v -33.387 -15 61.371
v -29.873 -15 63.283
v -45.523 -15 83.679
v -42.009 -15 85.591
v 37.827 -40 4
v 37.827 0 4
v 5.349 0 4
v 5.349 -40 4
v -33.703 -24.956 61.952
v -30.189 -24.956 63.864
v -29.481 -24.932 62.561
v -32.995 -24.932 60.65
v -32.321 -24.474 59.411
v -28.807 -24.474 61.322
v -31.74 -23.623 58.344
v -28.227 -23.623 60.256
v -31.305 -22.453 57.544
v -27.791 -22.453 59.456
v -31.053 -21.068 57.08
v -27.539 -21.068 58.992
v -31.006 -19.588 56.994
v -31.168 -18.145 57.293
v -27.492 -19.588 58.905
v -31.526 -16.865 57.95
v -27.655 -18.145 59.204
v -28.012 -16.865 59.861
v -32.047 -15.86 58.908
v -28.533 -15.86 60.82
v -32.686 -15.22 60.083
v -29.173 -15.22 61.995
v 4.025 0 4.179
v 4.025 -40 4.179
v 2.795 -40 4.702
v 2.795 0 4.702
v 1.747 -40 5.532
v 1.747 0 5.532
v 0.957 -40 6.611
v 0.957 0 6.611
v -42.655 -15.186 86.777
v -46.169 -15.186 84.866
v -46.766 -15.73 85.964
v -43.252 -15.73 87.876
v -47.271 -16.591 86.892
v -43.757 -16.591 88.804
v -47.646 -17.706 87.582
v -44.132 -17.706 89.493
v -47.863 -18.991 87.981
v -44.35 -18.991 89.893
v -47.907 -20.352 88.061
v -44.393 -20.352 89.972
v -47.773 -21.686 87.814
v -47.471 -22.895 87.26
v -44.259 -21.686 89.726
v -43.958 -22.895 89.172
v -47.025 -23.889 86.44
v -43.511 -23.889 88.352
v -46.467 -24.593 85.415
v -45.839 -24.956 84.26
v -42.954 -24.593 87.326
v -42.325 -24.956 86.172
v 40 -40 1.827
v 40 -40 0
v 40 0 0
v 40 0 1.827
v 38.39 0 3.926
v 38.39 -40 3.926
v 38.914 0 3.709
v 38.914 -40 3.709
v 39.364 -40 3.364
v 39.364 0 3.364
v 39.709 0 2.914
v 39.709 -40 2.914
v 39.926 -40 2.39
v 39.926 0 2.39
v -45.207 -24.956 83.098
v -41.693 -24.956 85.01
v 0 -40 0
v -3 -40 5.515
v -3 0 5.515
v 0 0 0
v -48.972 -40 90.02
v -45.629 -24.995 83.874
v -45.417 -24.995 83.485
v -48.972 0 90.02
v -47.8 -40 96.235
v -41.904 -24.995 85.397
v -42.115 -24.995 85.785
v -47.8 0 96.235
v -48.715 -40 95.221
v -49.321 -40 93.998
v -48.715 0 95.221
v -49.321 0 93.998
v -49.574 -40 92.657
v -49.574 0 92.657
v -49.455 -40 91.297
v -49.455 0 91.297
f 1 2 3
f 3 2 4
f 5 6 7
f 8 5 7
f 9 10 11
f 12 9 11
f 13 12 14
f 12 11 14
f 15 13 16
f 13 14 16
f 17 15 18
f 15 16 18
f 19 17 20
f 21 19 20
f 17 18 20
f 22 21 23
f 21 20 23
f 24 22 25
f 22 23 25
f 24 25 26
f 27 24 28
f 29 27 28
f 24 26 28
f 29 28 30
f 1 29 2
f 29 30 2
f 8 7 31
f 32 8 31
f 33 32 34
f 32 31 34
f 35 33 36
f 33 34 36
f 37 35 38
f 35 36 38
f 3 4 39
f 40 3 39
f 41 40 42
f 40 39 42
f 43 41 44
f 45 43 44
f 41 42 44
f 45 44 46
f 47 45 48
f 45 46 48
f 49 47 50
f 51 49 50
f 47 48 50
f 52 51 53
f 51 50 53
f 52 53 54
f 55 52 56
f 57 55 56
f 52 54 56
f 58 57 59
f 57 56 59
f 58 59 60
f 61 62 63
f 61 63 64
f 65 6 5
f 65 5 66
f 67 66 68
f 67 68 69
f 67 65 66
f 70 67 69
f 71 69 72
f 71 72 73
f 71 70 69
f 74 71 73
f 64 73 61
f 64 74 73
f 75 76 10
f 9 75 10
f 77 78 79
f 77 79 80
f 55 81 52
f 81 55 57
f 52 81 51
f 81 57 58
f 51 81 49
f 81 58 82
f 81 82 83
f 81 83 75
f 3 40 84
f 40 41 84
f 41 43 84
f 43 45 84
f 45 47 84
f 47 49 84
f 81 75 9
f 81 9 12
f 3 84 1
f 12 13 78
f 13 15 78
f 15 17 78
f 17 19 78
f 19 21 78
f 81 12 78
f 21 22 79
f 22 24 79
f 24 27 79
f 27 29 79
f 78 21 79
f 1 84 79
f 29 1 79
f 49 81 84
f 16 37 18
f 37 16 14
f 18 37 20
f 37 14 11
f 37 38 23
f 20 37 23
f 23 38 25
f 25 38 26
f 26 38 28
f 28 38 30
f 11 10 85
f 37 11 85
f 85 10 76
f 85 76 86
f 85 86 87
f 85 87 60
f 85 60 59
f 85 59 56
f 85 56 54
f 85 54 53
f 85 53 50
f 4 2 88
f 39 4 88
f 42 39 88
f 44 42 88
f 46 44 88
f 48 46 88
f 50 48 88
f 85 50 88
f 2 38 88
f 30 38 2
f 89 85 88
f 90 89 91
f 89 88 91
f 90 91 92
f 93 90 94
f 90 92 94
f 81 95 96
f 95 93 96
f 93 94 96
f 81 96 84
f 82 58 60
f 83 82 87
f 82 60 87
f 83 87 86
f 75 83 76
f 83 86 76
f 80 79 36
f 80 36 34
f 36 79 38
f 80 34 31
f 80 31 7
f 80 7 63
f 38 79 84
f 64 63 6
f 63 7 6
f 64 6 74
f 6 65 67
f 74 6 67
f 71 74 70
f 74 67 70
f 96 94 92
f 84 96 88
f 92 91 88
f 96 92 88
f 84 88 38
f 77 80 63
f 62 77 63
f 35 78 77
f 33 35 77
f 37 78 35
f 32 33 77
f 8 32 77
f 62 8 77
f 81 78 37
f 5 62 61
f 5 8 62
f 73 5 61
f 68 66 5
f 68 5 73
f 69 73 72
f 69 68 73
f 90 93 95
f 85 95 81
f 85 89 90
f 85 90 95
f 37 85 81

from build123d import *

# Parameters (mm, degrees)
F1_DEPTH    = 40
F2_T1_DEPTH = 40
F2_T3_DEPTH = 64.4948974279
F3_T1_DEPTH = 50.8639610307
F5_DEPTH    = 25


# Not quite as in the source:
# - a fillet or chamfer that OpenCascade refuses, or shapes differently, is made with other operations: its cross-section is extruded or revolved along the edge and cut away or added
# - a feature names something its author has since deleted; it is built from what else it names


with BuildPart() as f1:
    # F0 (on Front) → F1 (new body)
    with BuildSketch(Plane.XZ):
        Polygon((-51.3135007212, 94.3231601012), (-3, 5.5145230071), (0, 0), (40, 0), (40, 4), (2.3775297152, 4), (-47.7997987259, 96.2346773752), align=None)
    extrude(amount=F1_DEPTH)

    # F2: fillet of radius 5 on 2 edges, made by hand

    # F2_s2 → F2_t1 (join)
    with BuildSketch(Plane.XZ):
        with BuildLine():
            ThreePointArc((5.3494418593, 4), (2.7947386439, 4.7019200239), (0.9573143652, 6.6106034076))
            Line((0.9573143652, 6.6106034076), (2.3775297152, 4))
            Line((2.3775297152, 4), (5.3494418593, 4))
        make_face()
    extrude(amount=F2_T1_DEPTH)

    # F2_s4 → F2_t3 (cut)
    with BuildSketch(Plane.XZ.offset(-12.2474487139)):
        with BuildLine():
            ThreePointArc((-47.7997987259, 96.2346773752), (-49.4935666702, 93.3361748844), (-48.9723797433, 90.019771603))
            Line((-48.9723797433, 90.019771603), (-51.3135007212, 94.3231601012))
            Line((-51.3135007212, 94.3231601012), (-47.7997987259, 96.2346773752))
        make_face()
    extrude(amount=F2_T3_DEPTH, mode=Mode.SUBTRACT)

    # F3: fillet of radius 2.1727922061 on 2 edges, made by hand

    # F3_s2 → F3_t1 (cut)
    with BuildSketch(Plane.XZ.offset(-5.4319805153)):
        with BuildLine():
            ThreePointArc((37.8272077939, 4), (39.3636038969, 3.3636038969), (40, 1.8272077939))
            Line((40, 1.8272077939), (40, 4))
            Line((40, 4), (37.8272077939, 4))
        make_face()
    extrude(amount=F3_T1_DEPTH, mode=Mode.SUBTRACT)

    # F4 (on face) → F5 (cut)
    with BuildSketch(Plane(origin=(3.5137019952, 0, 1.9115172739), x_dir=(0, 1, 0), z_dir=(0.8784254988, 0, 0.4778793185))):
        with BuildLine():
            Line((-15, 69.8649734259), (-15, 95.260605216))
            ThreePointArc((-15, 95.260605216), (-19.6685312037, 100.2496059614), (-24.9560513748, 95.9220844447))
            Line((-24.9560513748, 95.9220844447), (-24.9560513748, 94.5991259873))
            Line((-24.9560513748, 94.5991259873), (-24.9560513748, 70.5264526546))
            ThreePointArc((-24.9560513748, 70.5264526546), (-20.3314687963, 64.8759726805), (-15, 69.8649734259))
        make_face()
        with BuildLine():
            Line((-24.9560513748, 94.5991259873), (-24.9560513748, 95.9220844447))
            ThreePointArc((-24.9560513748, 95.9220844447), (-25, 95.260605216), (-24.9560513748, 94.5991259873))
        make_face()
    extrude(amount=-F5_DEPTH, mode=Mode.SUBTRACT)


solid = f1.part
